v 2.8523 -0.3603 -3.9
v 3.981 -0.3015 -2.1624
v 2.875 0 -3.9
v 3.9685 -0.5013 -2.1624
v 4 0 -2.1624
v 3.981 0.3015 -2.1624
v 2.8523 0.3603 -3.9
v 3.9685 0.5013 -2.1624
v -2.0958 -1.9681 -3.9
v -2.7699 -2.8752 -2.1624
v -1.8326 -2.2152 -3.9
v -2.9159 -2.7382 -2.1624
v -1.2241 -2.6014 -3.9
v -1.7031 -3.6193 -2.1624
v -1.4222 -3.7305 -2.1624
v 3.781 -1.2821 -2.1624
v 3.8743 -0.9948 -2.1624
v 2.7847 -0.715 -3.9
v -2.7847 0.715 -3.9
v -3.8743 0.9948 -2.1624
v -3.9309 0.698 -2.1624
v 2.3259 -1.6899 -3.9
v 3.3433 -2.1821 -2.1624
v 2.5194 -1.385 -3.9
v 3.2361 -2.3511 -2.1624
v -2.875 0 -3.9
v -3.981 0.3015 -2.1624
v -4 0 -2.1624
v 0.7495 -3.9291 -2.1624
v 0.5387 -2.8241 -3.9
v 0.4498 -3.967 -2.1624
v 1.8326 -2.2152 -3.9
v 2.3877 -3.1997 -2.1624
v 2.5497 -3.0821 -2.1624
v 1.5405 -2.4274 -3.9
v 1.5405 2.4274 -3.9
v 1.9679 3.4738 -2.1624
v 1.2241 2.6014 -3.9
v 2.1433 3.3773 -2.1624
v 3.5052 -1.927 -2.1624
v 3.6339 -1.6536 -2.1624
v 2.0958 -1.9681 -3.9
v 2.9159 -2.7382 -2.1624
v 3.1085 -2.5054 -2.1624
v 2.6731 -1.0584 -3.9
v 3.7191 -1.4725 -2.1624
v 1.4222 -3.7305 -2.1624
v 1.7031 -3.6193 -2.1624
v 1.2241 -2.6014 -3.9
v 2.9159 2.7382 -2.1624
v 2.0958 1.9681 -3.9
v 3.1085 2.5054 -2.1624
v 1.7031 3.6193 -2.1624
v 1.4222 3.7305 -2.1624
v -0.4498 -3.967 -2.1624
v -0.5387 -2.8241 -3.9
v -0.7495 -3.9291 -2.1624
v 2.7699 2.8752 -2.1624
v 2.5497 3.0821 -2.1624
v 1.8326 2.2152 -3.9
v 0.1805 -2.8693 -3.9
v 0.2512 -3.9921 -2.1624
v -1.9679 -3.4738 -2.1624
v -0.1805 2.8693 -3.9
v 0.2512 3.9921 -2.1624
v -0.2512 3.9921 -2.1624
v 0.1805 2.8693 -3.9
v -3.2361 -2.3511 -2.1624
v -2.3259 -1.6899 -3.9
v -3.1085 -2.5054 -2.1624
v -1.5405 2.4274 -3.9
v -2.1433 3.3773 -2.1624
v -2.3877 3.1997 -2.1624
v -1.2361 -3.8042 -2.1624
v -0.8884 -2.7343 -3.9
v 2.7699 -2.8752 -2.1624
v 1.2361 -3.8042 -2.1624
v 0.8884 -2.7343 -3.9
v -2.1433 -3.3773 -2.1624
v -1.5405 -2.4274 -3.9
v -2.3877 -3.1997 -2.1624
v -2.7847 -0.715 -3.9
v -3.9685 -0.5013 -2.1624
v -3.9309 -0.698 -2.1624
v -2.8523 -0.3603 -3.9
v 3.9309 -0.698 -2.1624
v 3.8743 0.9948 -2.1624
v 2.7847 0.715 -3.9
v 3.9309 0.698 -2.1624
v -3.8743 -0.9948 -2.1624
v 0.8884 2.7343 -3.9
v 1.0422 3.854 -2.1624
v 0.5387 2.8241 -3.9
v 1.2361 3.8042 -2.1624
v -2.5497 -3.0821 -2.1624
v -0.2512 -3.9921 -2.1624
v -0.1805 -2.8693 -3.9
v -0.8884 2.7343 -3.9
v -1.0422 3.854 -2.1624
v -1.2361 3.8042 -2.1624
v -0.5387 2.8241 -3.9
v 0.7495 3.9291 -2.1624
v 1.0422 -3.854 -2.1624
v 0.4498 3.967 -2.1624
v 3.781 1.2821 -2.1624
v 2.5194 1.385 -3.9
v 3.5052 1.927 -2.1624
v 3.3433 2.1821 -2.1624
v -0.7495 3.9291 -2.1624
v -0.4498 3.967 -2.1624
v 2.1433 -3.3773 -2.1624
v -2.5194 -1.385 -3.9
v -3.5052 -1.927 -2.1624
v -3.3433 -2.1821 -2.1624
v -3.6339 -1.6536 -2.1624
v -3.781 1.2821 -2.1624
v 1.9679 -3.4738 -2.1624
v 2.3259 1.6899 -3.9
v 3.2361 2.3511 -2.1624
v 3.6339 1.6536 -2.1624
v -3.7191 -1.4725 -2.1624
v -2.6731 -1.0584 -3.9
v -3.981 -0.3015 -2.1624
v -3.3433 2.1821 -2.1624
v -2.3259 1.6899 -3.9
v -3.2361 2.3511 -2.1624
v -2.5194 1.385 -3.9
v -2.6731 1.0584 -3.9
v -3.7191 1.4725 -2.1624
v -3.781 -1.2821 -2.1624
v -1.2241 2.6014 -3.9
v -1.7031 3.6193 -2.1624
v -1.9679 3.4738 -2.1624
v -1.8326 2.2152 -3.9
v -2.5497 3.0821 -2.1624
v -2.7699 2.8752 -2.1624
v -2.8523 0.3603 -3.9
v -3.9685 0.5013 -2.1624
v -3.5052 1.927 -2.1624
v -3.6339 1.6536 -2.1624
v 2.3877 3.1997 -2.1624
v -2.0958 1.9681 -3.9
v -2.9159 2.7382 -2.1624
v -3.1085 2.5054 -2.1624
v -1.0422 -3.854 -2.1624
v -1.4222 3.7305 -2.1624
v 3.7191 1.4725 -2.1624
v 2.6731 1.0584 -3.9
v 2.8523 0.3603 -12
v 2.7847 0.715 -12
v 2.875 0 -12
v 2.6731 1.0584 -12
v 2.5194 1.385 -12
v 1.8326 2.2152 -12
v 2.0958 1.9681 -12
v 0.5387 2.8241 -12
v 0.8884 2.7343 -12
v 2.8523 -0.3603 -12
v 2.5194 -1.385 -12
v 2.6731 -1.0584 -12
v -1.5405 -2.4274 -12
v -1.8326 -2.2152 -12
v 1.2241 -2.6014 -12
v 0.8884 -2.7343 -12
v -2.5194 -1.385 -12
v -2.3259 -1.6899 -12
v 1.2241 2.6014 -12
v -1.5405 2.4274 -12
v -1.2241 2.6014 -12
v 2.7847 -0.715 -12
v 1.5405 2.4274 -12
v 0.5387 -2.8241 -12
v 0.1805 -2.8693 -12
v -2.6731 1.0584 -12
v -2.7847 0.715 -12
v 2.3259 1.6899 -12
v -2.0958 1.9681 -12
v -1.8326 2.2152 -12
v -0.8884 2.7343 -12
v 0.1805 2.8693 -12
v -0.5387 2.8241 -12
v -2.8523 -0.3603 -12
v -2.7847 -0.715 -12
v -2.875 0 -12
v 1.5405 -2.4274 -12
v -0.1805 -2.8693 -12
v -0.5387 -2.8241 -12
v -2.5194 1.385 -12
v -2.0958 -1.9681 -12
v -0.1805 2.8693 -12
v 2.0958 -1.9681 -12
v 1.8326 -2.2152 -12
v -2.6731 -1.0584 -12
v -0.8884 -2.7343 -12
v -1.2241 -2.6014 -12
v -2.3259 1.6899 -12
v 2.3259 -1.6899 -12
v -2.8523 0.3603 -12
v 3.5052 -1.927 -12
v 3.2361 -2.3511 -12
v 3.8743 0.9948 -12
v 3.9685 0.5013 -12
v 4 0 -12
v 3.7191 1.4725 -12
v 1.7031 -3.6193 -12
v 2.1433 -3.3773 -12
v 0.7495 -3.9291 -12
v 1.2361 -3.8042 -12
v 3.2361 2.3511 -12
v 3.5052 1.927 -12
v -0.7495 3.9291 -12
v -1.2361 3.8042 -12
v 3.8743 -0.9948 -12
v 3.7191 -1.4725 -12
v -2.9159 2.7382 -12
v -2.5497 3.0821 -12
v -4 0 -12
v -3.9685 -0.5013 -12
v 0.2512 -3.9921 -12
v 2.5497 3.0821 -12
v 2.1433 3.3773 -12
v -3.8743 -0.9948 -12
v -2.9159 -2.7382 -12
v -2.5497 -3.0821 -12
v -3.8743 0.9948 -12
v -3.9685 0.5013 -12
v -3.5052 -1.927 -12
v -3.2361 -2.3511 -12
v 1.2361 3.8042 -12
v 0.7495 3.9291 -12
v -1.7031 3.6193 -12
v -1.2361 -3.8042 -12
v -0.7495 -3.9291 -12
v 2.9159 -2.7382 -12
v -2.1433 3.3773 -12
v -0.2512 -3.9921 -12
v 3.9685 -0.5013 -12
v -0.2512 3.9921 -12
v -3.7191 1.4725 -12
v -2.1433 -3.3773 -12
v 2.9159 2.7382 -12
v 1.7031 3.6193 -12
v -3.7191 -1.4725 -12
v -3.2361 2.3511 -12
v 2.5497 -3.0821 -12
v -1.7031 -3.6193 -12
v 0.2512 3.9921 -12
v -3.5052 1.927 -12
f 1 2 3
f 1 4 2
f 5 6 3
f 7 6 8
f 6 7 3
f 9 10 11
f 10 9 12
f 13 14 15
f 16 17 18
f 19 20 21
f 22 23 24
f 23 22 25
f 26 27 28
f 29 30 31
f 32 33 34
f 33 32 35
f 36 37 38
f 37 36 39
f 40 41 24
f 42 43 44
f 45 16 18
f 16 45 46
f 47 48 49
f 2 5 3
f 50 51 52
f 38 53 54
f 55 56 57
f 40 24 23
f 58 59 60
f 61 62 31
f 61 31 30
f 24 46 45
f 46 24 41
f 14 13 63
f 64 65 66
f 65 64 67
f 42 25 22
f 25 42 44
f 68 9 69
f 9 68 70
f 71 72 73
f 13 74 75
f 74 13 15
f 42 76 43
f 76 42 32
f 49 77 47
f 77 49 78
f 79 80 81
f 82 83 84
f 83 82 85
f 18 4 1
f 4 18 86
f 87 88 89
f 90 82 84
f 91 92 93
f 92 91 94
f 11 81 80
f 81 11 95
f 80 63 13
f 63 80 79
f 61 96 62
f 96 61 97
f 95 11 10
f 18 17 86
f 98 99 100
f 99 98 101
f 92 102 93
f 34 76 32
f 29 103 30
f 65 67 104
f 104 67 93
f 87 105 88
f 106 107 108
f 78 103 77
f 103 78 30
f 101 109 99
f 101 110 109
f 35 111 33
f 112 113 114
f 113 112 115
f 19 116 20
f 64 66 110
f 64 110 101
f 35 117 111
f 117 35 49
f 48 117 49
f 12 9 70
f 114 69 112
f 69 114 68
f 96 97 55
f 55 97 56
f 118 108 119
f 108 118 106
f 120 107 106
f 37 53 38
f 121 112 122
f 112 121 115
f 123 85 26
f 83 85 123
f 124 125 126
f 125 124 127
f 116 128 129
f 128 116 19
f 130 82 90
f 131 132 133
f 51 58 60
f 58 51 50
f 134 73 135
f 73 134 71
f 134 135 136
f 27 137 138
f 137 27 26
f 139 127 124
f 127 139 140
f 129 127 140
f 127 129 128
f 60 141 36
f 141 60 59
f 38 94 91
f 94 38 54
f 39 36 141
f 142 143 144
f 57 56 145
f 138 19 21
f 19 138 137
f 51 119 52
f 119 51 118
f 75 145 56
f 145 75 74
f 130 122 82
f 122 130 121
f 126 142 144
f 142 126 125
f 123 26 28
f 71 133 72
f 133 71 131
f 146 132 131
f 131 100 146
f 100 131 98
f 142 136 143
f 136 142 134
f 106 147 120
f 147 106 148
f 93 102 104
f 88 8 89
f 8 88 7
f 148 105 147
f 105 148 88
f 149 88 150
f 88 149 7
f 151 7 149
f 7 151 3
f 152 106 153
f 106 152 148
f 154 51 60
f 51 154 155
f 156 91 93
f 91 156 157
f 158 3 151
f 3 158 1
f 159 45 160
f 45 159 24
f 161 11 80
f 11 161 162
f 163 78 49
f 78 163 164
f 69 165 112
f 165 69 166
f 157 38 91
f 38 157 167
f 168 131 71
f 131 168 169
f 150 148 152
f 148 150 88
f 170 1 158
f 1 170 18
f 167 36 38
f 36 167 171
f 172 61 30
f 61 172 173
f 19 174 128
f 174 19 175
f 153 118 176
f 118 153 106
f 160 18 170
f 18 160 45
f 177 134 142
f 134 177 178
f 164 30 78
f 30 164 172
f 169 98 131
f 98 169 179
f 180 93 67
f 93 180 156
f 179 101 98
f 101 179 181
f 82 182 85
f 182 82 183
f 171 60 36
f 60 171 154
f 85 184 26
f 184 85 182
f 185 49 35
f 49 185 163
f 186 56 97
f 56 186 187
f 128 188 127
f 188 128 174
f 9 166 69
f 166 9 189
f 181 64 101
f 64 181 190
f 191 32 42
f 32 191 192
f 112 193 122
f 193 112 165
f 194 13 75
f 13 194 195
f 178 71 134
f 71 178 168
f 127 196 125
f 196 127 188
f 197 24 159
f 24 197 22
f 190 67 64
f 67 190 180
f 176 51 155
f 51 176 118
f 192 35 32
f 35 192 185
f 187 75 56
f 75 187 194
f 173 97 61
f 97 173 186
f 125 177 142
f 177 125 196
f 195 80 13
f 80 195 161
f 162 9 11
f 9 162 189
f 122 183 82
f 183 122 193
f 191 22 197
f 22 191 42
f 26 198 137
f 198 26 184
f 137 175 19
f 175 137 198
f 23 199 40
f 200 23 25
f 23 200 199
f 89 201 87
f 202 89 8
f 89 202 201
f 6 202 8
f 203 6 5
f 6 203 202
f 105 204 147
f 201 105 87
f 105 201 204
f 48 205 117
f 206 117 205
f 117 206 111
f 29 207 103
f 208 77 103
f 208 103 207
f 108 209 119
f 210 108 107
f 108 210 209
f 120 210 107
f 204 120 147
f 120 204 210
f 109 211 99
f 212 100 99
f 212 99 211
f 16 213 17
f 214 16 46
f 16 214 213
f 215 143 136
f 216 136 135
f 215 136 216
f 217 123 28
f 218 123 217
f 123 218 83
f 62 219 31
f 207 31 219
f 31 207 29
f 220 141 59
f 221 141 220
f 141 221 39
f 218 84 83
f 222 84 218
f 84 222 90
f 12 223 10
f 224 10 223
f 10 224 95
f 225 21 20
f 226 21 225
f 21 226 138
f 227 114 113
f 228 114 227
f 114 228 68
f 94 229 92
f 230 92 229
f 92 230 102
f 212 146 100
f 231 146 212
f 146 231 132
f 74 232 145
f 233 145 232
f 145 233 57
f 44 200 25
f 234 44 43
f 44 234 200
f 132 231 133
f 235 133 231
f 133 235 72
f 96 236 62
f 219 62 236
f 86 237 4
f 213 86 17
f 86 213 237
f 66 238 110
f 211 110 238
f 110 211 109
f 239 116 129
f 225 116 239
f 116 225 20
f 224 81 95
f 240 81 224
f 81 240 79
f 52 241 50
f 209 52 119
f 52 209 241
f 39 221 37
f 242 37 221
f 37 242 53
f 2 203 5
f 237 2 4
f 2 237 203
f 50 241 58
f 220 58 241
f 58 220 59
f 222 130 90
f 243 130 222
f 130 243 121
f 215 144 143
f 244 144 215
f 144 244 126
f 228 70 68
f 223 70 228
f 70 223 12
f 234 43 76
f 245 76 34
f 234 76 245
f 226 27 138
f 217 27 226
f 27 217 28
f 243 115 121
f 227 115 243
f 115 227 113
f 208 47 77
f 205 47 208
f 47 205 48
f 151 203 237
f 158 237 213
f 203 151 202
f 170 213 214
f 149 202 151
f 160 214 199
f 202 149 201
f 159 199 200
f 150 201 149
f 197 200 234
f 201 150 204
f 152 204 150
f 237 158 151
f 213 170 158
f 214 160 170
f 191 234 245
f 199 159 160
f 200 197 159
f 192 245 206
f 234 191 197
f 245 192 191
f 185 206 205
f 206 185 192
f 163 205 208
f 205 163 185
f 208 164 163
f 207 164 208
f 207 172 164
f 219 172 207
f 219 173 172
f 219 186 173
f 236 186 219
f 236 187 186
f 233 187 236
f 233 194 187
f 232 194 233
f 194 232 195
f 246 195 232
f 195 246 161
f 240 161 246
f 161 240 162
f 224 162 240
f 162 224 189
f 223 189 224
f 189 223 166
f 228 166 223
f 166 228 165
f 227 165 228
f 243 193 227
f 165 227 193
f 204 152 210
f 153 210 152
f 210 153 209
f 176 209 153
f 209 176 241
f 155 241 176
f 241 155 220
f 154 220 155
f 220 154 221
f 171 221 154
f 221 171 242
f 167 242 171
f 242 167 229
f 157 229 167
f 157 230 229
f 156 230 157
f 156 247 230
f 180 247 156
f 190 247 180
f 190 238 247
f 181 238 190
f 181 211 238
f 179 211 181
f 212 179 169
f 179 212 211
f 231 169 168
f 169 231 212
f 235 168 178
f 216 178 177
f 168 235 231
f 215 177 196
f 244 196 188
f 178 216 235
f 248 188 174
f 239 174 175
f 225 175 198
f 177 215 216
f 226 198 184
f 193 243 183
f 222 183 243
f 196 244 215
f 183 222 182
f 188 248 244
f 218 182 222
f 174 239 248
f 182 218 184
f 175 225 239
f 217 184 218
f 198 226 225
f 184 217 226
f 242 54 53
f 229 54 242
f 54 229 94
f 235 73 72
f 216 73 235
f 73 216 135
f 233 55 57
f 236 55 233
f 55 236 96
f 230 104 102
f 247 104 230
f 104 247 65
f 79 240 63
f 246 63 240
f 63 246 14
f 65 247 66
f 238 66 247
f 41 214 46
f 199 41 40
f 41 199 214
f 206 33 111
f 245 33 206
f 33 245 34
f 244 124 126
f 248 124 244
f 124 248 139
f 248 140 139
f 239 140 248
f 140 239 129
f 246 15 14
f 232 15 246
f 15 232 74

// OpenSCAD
$fn = 50;

difference() {
	union() {
		translate(v = [0, 0, -12.0]) {
			cylinder(h = 12, r = 4.0);
		}
	}
	union() {
		translate(v = [0, 0, 0]) {
			rotate(a = [0, 0, 0]) {
				difference() {
					union() {
						translate(v = [0, 0, -15.0]) {
							cylinder(h = 15, r = 2.6);
						}
						translate(v = [0, 0, -3.9]) {
							cylinder(h = 3.9, r1 = 2.875, r2 = 5.4);
						}
						translate(v = [0, 0, -15.0]) {
							cylinder(h = 15, r = 2.875);
						}
						translate(v = [0, 0, -15.0]) {
							cylinder(h = 15, r = 2.6);
						}
					}
					union();
				}
			}
		}
	}
}
